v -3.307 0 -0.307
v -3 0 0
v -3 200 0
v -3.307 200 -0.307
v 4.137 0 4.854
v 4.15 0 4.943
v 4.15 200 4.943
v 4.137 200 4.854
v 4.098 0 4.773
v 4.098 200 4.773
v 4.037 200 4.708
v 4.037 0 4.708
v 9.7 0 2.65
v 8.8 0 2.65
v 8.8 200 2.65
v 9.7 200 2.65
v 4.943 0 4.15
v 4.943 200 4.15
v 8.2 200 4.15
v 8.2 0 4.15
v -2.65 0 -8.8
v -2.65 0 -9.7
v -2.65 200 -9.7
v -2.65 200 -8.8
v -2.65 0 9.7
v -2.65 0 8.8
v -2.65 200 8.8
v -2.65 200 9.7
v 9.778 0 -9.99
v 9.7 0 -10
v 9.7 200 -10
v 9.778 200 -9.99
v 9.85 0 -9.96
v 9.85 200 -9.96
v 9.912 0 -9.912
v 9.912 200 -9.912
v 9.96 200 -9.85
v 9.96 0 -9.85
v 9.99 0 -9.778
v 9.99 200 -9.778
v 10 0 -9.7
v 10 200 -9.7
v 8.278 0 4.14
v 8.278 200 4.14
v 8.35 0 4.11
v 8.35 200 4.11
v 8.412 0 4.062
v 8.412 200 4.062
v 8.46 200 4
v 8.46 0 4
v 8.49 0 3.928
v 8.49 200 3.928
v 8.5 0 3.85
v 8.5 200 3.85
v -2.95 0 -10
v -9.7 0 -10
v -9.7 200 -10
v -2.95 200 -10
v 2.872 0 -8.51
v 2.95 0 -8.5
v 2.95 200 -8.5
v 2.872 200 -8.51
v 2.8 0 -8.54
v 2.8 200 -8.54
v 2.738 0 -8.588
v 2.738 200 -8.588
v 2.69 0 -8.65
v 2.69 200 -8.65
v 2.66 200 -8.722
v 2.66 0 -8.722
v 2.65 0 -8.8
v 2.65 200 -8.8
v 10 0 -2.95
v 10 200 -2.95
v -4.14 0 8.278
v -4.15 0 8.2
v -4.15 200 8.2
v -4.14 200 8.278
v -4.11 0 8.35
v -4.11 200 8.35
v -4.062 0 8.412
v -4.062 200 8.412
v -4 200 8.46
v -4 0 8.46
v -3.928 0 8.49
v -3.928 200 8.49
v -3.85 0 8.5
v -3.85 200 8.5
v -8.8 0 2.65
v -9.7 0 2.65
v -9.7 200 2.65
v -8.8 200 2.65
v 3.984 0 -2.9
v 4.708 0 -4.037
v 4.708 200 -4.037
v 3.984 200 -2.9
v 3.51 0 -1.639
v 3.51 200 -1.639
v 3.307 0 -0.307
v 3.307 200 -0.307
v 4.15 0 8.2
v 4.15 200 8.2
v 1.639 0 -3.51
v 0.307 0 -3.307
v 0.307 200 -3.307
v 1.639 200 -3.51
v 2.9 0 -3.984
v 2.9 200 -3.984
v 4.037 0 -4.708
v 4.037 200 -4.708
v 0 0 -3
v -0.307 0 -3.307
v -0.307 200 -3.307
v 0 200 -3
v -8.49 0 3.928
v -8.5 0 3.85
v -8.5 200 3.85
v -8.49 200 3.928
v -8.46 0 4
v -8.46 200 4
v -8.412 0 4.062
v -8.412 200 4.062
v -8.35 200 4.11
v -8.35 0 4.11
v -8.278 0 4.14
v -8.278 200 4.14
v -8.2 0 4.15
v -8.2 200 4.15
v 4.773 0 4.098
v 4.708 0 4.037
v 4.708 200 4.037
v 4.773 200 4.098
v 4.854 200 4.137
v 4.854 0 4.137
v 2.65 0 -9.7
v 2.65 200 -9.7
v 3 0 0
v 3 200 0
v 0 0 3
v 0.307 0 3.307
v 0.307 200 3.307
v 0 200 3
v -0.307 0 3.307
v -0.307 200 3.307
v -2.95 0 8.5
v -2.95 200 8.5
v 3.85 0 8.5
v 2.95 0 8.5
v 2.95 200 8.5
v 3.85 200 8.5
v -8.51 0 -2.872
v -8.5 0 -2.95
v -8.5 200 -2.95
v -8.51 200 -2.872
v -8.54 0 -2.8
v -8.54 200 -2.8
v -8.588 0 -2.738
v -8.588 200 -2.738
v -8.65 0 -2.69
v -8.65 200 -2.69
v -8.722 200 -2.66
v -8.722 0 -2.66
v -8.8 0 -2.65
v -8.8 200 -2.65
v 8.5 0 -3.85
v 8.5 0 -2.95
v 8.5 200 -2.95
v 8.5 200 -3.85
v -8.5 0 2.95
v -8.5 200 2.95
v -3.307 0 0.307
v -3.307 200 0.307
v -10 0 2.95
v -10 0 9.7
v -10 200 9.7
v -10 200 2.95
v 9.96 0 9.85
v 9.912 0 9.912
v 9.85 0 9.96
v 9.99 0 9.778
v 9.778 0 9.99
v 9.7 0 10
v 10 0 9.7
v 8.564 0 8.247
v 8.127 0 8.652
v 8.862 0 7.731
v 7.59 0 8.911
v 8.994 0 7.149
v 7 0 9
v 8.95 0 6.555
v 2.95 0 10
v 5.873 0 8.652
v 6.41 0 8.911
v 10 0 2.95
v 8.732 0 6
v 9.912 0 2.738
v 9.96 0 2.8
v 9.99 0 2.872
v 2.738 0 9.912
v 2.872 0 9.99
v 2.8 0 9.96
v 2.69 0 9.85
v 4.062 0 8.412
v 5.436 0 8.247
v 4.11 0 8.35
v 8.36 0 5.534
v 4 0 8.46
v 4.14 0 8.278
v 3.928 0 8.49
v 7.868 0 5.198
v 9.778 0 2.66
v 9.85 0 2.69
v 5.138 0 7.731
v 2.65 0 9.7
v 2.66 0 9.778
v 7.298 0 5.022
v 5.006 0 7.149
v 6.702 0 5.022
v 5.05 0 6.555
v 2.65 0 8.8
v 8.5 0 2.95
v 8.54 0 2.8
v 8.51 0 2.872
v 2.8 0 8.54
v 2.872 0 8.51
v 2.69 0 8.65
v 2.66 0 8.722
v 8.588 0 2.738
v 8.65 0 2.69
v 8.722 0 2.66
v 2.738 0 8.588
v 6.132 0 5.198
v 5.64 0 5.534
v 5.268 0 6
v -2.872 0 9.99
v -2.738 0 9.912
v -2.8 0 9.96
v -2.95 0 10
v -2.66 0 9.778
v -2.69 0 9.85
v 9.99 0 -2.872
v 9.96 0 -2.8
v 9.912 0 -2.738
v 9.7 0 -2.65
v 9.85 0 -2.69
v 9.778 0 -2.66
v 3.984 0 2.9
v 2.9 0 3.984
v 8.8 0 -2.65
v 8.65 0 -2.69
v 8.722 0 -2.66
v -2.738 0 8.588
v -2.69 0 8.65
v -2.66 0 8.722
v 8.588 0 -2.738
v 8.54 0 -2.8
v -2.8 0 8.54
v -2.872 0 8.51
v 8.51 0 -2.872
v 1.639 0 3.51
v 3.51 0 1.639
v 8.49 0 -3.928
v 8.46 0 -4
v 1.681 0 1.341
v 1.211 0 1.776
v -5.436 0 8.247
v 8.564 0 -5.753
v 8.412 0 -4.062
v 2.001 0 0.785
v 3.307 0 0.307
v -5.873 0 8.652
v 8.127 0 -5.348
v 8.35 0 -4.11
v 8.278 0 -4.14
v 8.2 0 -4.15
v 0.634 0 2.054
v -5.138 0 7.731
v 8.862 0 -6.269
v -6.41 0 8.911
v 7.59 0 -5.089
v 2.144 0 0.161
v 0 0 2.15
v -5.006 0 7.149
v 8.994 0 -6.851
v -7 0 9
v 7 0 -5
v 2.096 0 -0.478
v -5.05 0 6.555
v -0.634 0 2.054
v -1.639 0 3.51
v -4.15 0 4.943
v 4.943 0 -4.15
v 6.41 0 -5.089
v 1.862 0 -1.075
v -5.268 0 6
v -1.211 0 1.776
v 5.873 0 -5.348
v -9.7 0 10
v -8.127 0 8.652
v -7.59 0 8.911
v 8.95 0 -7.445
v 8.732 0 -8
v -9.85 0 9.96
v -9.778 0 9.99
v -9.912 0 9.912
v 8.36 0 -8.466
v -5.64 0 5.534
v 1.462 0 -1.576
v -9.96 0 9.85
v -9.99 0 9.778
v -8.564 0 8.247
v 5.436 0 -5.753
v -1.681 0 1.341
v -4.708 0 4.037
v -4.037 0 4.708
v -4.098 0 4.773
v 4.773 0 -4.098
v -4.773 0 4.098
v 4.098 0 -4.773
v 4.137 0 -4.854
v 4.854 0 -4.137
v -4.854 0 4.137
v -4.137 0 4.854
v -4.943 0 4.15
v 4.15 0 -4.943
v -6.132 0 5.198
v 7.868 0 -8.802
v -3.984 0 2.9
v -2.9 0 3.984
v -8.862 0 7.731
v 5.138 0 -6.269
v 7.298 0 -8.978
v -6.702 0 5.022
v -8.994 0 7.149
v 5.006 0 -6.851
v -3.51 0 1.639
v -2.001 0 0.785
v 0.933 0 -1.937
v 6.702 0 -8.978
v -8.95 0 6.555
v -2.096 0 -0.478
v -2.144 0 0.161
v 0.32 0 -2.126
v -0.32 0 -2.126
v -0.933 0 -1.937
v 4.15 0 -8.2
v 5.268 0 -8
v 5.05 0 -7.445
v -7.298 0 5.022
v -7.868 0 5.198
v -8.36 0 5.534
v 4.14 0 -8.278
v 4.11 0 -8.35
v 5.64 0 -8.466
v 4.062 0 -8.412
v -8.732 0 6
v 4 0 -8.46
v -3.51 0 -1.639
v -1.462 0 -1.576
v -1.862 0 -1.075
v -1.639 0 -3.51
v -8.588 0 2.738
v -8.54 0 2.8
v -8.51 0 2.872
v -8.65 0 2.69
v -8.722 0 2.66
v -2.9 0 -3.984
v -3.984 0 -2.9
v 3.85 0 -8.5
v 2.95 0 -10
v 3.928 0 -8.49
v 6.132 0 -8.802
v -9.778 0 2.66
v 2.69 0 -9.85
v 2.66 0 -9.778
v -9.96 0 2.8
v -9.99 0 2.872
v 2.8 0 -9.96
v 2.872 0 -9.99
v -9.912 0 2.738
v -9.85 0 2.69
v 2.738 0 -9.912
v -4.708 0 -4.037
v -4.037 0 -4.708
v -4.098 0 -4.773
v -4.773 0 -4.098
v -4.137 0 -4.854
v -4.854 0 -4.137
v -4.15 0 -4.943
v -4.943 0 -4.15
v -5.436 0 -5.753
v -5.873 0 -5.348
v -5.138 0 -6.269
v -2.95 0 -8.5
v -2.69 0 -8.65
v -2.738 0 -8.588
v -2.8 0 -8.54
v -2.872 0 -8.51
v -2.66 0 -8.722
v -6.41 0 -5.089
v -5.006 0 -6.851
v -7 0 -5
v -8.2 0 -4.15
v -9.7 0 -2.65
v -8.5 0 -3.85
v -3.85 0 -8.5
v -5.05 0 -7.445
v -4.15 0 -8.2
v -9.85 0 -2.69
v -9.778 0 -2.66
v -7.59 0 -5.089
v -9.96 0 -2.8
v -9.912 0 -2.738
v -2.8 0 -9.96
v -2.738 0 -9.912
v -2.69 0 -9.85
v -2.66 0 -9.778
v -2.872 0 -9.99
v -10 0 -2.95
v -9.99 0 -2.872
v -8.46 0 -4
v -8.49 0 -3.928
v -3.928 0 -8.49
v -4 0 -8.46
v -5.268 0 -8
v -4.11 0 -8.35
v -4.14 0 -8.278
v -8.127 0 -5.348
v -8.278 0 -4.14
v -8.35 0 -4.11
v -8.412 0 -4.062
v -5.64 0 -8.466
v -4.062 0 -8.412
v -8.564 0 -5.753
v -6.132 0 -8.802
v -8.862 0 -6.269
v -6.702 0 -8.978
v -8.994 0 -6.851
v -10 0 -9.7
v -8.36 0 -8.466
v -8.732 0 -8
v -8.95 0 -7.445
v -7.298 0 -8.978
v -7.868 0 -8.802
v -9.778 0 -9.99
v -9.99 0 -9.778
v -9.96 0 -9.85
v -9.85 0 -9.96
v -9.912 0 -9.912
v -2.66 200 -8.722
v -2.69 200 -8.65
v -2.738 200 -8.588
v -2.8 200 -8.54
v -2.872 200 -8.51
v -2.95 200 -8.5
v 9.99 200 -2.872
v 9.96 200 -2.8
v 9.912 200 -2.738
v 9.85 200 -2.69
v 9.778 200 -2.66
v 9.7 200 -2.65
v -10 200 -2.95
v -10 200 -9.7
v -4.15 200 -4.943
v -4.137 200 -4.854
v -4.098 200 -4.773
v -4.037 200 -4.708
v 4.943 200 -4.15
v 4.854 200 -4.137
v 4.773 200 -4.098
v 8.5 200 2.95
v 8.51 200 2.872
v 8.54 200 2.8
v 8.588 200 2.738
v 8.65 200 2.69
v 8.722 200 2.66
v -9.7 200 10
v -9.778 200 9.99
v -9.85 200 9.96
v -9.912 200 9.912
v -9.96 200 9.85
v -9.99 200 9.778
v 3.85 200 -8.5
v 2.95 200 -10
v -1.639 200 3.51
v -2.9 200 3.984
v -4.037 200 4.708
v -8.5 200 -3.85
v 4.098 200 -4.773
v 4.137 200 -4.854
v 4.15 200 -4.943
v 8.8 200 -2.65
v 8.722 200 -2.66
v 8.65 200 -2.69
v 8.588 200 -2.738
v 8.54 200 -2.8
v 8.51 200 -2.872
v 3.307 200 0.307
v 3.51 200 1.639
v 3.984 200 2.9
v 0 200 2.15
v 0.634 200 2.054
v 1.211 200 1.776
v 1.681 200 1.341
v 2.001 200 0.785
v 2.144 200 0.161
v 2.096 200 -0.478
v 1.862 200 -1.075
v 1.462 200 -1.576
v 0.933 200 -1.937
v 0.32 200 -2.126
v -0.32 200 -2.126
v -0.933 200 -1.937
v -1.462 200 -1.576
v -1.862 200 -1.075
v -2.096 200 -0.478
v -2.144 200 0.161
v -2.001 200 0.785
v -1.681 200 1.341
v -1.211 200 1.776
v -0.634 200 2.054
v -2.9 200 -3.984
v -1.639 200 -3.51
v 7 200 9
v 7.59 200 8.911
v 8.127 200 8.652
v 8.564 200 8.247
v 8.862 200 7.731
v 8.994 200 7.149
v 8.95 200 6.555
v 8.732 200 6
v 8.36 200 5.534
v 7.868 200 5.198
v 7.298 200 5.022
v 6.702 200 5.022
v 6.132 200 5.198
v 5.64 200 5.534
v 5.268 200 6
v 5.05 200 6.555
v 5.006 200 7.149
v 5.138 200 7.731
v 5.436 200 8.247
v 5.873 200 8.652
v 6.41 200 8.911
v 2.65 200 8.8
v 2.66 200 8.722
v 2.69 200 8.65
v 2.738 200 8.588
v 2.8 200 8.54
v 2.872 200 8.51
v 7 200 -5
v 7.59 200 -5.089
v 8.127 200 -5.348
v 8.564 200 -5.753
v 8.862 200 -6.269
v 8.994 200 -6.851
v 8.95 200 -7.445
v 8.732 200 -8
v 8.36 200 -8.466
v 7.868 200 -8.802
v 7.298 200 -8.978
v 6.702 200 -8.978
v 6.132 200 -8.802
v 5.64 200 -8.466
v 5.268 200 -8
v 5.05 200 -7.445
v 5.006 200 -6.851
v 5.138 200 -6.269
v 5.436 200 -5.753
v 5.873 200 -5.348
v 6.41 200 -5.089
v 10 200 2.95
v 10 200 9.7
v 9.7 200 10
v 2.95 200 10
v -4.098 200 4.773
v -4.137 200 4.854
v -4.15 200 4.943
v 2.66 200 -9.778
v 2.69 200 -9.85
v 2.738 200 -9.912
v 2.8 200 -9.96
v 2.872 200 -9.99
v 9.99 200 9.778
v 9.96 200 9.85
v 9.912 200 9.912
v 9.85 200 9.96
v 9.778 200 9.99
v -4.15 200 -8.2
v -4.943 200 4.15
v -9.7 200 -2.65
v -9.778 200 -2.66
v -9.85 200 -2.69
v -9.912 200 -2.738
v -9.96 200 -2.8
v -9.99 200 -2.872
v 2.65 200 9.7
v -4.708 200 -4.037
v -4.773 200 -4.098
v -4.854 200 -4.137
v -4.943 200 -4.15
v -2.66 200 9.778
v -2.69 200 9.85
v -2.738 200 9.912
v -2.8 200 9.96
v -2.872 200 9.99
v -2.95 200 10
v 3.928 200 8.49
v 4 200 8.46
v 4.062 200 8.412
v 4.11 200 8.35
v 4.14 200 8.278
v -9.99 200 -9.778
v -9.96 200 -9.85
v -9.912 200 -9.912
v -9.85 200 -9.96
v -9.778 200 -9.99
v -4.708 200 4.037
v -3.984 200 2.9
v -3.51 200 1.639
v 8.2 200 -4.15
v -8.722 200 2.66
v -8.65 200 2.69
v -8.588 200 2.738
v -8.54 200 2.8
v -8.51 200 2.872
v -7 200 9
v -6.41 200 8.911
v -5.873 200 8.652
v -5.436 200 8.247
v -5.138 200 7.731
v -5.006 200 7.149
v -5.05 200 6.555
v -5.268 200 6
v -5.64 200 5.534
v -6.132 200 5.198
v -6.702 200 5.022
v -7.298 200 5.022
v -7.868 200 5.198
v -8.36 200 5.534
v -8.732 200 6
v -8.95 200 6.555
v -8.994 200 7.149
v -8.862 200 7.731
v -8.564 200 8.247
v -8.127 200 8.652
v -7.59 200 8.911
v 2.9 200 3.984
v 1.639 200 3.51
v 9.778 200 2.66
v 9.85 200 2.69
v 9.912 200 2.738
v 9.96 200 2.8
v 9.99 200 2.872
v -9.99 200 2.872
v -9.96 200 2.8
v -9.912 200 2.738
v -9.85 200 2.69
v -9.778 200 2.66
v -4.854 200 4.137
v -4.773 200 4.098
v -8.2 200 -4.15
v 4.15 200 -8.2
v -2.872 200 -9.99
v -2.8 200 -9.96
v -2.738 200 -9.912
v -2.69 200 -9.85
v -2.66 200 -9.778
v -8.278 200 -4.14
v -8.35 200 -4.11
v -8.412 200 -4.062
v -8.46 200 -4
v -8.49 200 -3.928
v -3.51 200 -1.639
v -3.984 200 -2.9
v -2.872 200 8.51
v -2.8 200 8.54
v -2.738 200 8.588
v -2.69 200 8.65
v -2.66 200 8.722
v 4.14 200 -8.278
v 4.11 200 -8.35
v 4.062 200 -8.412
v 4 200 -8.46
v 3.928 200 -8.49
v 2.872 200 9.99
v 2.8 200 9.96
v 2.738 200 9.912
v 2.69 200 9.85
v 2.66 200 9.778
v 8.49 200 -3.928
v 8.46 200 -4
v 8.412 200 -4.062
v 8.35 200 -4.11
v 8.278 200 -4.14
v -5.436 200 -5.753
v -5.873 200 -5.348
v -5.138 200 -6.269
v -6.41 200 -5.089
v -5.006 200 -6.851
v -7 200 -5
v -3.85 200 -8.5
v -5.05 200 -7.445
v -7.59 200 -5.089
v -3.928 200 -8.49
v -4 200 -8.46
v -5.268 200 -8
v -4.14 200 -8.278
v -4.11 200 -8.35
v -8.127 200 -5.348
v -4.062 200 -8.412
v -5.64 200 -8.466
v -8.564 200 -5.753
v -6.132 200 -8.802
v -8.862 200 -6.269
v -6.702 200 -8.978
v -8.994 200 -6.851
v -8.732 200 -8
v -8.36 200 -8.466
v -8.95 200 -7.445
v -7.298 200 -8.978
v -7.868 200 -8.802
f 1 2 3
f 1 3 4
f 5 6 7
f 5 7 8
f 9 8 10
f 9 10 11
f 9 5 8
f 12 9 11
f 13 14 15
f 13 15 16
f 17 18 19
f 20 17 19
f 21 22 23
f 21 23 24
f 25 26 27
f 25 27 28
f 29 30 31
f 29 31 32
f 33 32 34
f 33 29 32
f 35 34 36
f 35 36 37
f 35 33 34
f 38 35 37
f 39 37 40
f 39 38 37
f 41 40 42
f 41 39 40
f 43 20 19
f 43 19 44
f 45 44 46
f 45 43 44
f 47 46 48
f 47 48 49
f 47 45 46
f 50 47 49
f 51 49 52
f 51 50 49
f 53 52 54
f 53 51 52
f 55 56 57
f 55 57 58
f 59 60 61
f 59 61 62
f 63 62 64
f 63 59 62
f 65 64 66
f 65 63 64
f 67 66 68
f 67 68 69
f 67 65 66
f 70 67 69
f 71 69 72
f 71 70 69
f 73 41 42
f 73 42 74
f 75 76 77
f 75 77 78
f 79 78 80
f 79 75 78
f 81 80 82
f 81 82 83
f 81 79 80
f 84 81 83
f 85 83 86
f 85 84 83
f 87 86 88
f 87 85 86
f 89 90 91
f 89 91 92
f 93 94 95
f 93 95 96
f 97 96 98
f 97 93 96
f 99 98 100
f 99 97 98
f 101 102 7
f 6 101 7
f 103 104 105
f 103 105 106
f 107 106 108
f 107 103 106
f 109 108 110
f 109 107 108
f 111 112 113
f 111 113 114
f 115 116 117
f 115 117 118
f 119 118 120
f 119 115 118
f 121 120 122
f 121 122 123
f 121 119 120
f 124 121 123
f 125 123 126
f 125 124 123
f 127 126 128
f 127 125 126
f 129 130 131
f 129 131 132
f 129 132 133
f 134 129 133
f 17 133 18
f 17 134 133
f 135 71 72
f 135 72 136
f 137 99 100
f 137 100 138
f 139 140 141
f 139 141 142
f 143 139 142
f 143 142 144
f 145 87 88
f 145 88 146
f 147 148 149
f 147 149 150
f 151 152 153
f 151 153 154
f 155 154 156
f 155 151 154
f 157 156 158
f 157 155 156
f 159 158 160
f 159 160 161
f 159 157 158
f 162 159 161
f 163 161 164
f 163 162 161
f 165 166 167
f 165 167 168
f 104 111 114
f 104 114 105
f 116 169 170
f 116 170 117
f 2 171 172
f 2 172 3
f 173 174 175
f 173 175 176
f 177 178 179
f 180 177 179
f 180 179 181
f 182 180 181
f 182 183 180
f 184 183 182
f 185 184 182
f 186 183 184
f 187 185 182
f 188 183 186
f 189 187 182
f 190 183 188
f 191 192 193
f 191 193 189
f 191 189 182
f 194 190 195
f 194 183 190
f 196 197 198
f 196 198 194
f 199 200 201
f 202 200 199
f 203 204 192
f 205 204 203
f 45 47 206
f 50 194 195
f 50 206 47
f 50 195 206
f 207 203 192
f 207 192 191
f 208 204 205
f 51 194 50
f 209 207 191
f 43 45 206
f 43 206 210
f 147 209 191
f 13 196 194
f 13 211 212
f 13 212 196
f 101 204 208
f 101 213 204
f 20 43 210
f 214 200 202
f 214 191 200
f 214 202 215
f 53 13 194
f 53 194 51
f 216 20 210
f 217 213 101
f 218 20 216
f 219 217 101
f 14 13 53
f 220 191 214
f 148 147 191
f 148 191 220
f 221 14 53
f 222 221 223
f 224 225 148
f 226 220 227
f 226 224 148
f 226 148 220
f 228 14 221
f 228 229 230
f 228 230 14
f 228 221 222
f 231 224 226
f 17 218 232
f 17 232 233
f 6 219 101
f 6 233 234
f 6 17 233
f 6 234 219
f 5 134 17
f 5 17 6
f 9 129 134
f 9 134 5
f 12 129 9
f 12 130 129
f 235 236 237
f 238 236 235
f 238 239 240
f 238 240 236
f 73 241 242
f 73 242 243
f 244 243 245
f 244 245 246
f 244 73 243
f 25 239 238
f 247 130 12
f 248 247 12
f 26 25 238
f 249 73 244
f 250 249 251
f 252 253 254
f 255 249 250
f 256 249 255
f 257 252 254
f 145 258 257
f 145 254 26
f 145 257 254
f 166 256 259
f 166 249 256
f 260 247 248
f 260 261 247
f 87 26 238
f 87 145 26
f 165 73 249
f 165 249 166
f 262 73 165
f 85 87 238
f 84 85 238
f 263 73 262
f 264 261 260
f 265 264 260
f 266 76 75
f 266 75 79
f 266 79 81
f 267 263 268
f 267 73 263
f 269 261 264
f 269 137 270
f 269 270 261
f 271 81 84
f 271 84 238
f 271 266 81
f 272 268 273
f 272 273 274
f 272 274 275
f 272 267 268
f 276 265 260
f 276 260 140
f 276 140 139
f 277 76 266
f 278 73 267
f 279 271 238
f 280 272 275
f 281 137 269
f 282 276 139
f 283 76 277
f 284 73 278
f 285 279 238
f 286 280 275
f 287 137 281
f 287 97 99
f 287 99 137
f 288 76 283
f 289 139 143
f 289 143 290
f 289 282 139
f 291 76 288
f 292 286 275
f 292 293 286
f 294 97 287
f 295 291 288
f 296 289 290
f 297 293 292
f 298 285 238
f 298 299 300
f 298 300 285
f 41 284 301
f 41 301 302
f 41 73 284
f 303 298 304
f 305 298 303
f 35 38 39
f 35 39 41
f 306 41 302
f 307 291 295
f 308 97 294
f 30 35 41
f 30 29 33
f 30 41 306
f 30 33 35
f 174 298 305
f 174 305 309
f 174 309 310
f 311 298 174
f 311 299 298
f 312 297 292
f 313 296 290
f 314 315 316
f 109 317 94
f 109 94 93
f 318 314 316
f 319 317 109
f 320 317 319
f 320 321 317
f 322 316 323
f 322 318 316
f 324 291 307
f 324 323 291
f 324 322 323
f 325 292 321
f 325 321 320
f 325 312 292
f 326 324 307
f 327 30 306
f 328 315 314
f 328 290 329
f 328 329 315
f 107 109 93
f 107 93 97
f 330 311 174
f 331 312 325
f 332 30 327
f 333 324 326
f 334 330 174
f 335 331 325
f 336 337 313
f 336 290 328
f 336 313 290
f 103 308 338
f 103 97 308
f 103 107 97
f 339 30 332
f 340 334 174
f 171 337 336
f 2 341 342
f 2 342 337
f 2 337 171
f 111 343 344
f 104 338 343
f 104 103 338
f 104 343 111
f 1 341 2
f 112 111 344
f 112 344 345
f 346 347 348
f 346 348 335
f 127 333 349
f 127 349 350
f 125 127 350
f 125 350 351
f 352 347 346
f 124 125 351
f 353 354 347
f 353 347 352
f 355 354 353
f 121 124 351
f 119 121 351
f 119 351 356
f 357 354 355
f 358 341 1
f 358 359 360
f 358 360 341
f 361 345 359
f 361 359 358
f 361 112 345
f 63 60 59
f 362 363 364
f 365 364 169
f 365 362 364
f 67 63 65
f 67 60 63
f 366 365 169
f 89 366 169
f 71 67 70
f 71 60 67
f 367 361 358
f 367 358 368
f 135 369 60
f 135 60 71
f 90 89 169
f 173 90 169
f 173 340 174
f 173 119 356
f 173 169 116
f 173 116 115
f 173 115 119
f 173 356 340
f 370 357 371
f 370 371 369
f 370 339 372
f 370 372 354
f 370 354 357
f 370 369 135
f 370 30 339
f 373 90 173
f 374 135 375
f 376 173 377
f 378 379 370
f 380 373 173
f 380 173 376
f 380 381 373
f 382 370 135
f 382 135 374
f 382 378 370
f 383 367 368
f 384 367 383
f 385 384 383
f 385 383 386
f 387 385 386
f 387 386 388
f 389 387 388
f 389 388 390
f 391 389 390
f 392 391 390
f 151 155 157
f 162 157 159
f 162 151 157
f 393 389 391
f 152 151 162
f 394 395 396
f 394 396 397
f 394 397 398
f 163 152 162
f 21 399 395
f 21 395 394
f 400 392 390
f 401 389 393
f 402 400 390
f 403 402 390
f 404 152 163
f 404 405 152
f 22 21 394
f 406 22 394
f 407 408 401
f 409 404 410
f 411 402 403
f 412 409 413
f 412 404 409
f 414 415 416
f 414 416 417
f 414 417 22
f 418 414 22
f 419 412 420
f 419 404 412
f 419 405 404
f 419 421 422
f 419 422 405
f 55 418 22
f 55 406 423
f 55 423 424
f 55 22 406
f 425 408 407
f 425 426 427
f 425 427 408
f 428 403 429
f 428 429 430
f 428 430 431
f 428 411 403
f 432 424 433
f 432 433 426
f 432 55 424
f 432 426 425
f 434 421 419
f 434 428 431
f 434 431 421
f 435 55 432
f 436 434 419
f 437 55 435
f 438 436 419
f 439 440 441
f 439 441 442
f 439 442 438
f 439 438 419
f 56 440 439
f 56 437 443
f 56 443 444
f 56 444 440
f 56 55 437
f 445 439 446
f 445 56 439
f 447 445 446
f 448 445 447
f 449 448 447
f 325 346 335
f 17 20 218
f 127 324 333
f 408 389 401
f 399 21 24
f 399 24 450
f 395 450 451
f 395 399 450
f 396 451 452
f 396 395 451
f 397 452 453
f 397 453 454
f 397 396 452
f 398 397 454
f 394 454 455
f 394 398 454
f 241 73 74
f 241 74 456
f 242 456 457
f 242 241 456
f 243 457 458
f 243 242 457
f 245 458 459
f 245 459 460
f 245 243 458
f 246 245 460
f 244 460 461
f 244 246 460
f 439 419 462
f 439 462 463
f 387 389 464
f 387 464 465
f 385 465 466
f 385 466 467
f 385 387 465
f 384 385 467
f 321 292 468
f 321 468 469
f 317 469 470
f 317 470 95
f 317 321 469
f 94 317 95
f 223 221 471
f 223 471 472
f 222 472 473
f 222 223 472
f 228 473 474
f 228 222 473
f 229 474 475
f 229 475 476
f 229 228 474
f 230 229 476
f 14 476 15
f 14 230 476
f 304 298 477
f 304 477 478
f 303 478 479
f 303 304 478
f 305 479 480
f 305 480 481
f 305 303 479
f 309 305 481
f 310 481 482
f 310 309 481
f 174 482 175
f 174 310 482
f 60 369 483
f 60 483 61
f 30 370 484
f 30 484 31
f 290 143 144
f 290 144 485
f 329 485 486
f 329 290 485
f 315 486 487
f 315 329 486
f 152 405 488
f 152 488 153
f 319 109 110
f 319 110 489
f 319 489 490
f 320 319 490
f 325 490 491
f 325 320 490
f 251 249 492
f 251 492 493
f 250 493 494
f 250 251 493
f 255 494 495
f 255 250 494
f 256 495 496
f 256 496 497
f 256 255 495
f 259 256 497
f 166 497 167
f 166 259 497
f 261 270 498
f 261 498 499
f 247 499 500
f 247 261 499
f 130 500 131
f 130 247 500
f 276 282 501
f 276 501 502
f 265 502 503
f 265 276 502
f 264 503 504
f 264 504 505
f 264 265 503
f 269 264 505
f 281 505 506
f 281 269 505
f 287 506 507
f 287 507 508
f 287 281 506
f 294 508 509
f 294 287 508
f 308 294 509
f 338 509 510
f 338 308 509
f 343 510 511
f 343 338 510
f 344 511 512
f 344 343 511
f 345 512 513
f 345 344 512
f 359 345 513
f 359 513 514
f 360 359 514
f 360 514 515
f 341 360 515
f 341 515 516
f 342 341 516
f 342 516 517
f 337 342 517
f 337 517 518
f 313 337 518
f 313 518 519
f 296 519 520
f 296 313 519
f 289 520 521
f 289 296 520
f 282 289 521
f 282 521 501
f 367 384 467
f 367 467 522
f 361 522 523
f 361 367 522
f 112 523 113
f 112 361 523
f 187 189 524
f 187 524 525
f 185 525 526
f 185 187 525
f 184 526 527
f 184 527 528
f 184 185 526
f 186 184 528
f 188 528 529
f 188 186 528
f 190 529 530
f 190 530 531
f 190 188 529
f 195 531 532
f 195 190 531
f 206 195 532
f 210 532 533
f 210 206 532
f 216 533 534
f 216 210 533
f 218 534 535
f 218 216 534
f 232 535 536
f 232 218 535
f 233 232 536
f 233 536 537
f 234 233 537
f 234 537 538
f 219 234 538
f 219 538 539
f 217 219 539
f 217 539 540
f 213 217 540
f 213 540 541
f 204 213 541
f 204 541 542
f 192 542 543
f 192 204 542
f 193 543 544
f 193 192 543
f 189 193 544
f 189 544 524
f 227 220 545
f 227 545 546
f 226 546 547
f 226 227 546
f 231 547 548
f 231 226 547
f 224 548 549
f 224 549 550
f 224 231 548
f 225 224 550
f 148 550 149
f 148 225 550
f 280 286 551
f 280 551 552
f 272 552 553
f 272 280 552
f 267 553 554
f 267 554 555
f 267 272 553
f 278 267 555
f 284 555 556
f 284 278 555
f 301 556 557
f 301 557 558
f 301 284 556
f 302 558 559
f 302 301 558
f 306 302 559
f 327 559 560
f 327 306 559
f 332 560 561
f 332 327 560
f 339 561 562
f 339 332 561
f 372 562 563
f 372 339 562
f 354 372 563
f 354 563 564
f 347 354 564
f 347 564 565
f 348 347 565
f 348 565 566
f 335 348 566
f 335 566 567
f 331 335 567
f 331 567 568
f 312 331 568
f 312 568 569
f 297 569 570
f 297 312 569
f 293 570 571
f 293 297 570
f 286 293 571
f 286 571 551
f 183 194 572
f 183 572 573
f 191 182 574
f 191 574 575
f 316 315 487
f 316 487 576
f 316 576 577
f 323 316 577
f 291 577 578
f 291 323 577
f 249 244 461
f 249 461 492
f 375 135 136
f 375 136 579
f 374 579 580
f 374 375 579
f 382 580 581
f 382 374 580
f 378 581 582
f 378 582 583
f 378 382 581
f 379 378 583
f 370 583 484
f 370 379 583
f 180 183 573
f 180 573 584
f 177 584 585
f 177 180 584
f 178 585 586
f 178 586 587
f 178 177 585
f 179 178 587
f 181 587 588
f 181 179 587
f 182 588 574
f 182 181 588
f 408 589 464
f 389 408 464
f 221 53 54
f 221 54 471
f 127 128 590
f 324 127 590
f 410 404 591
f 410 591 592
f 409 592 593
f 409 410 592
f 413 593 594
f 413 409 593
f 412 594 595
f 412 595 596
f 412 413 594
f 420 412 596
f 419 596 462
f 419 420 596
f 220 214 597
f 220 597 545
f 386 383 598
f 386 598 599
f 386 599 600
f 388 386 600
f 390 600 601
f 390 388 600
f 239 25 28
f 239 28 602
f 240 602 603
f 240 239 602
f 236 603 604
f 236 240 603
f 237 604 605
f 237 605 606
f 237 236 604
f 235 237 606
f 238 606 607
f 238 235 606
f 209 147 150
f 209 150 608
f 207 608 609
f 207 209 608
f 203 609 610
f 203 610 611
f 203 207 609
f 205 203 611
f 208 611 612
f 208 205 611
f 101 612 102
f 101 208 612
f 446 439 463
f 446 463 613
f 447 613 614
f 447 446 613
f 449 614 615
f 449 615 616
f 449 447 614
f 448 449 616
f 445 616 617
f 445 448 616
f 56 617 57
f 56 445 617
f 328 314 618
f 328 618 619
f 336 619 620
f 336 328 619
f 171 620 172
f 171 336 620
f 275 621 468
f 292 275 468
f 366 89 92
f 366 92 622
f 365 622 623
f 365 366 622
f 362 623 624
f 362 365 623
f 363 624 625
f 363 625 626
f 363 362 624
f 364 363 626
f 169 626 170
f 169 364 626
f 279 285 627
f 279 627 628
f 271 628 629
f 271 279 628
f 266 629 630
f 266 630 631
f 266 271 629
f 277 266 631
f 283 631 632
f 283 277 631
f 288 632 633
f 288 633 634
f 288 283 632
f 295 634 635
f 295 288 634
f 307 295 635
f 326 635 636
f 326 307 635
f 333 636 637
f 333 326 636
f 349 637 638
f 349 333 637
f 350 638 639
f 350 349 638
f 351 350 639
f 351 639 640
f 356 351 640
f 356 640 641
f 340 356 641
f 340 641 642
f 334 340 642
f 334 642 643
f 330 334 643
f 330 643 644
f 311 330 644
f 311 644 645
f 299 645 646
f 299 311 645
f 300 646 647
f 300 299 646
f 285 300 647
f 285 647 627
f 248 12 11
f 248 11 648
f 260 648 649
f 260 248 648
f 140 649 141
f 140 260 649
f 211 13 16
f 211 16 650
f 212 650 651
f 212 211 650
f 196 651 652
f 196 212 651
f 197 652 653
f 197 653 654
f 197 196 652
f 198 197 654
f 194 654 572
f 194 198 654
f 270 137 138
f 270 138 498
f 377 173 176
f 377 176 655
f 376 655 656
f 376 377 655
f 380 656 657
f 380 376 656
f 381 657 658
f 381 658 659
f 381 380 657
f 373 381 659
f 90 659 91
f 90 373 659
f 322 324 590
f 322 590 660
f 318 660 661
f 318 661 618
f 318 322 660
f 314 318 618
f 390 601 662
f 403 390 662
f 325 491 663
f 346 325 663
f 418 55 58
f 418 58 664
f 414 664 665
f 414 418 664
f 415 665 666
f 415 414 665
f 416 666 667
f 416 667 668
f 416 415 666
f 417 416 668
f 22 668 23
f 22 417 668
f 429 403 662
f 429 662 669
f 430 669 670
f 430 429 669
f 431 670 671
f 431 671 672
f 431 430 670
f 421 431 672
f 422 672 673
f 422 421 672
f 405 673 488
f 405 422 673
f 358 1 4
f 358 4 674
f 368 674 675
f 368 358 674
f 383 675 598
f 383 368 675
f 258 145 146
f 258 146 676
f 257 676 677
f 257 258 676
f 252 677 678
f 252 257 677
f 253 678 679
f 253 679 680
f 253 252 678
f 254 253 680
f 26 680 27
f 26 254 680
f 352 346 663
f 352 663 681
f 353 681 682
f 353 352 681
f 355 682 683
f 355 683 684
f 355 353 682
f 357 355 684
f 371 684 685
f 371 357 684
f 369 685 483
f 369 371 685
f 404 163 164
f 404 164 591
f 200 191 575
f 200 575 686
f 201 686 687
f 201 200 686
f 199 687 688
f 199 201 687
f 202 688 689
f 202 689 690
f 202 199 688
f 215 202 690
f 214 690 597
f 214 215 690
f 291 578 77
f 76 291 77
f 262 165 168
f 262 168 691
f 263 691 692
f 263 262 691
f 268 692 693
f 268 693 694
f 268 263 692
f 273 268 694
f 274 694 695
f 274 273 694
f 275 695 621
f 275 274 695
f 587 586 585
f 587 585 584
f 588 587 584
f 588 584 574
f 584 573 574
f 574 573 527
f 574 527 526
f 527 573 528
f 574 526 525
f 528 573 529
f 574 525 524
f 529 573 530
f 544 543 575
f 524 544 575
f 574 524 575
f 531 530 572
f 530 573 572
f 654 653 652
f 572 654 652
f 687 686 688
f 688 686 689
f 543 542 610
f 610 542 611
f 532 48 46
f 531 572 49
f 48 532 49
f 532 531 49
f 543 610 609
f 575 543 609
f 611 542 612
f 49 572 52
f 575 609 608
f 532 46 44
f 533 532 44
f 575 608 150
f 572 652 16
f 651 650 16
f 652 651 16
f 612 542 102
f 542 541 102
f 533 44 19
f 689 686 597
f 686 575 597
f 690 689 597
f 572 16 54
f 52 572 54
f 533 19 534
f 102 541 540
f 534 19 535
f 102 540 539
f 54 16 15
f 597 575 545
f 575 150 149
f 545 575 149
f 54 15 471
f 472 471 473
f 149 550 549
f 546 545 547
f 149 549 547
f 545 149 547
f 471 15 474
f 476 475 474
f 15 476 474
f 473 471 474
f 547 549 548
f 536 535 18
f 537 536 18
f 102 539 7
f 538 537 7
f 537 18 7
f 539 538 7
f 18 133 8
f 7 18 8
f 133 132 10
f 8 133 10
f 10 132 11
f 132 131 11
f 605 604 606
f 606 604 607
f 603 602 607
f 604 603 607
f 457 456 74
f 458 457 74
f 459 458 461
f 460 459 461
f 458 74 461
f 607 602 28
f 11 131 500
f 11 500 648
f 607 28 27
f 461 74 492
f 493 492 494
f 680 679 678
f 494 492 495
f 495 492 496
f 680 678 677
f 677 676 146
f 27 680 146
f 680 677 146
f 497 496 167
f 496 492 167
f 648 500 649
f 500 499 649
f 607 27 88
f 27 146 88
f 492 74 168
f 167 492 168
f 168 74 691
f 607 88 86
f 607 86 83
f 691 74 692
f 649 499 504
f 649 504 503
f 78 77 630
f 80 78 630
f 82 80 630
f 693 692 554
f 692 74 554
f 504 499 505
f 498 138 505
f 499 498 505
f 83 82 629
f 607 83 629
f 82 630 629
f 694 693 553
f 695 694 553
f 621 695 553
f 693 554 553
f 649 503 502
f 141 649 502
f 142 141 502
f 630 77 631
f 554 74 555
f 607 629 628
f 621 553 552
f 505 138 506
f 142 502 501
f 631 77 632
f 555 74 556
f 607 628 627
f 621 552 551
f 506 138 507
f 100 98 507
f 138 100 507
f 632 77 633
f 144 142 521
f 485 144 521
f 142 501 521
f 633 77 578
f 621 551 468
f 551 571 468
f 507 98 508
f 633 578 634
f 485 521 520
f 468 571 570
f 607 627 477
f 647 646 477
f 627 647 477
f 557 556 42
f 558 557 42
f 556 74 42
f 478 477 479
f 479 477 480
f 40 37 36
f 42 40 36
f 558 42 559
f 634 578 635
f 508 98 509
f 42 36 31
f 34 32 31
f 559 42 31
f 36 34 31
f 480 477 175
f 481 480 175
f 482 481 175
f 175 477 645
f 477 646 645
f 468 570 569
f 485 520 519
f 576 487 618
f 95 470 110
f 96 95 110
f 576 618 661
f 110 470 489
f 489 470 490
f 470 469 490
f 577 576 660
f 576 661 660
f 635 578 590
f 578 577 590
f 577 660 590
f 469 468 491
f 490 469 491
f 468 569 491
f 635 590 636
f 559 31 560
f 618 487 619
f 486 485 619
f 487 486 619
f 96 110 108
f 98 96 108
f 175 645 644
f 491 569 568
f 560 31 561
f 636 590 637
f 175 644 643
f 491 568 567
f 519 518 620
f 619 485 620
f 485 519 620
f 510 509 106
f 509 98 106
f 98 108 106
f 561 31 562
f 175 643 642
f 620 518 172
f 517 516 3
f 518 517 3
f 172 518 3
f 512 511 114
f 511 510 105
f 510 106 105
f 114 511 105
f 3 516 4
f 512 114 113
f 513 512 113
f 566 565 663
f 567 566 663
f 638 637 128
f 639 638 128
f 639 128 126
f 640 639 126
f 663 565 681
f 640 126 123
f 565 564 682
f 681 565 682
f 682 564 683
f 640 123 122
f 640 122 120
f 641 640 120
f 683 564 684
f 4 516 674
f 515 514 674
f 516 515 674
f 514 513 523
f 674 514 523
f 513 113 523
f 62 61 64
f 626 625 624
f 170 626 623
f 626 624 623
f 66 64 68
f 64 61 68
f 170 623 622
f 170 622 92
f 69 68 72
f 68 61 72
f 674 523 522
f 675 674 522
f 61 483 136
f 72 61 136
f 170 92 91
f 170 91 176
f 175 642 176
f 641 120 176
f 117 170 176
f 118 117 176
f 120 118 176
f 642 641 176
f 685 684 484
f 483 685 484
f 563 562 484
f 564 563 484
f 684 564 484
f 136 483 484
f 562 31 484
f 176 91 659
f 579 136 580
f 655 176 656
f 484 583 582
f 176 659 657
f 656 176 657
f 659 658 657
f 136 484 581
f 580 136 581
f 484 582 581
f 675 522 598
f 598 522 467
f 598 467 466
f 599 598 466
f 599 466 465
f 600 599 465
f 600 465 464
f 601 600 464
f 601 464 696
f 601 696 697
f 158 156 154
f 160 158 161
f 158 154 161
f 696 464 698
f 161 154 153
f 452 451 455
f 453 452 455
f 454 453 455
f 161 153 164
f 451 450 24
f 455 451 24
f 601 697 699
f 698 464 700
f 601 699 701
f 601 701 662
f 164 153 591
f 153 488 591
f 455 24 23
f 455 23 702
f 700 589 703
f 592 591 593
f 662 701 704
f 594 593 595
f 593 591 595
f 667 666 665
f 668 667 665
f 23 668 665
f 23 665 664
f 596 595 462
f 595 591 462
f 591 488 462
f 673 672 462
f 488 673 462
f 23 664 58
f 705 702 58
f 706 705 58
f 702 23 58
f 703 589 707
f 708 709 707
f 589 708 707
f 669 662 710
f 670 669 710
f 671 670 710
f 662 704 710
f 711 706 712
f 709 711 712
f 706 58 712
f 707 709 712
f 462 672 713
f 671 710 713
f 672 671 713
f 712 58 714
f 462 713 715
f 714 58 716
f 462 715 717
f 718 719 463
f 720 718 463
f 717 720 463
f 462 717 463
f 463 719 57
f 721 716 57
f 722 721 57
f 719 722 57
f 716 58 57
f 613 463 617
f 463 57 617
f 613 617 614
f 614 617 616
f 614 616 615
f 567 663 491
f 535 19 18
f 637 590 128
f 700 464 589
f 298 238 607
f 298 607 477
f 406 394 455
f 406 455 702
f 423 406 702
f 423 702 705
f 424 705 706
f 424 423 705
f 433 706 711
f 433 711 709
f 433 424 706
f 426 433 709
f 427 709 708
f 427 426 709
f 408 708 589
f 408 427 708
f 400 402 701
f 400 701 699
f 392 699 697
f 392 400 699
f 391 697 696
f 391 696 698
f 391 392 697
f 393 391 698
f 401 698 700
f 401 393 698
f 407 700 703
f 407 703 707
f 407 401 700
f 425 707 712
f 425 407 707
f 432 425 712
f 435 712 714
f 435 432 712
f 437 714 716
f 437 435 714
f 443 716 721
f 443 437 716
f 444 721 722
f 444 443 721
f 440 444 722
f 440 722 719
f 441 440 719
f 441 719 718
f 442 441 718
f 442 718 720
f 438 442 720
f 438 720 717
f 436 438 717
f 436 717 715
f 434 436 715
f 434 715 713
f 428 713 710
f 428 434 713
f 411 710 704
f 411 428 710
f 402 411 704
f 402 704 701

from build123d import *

# Parameters (mm, degrees)
SKETCH_1_R      = 2.15
SKETCH_1_R_2    = 2
EXTRUDE_1_DEPTH = 200


with BuildPart() as part:
    # 스케치1 → 보스-돌출1 (new body)
    with BuildSketch(Plane(origin=(0, 0, 0), x_dir=(1, 0, 0), z_dir=(0, 1, 0))):
        with BuildLine():
            Line((4.15, 4.942749448), (4.15, 8.2))
            ThreePointArc((4.15, 8.2), (4.062132034, 8.412132034), (3.85, 8.5))
            Line((3.85, 8.5), (2.95, 8.5))
            ThreePointArc((2.95, 8.5), (2.737867966, 8.587867966), (2.65, 8.8))
            Line((2.65, 8.8), (2.65, 9.7))
            ThreePointArc((2.65, 9.7), (2.737867966, 9.912132034), (2.95, 10))
            Line((2.95, 10), (9.7, 10))
            ThreePointArc((9.7, 10), (9.912132034, 9.912132034), (10, 9.7))
            Line((10, 9.7), (10, 2.95))
            ThreePointArc((10, 2.95), (9.912132034, 2.737867966), (9.7, 2.65))
            Line((9.7, 2.65), (8.8, 2.65))
            ThreePointArc((8.8, 2.65), (8.587867966, 2.737867966), (8.5, 2.95))
            Line((8.5, 2.95), (8.5, 3.85))
            ThreePointArc((8.5, 3.85), (8.412132034, 4.062132034), (8.2, 4.15))
            Line((8.2, 4.15), (4.942749448, 4.15))
            ThreePointArc((4.942749448, 4.15), (4.812307598, 4.120157221), (4.707817398, 4.03656616))
            ThreePointArc((4.707817398, 4.03656616), (3.714379176, 2.282021525), (3.307277366, 0.307277366))
            Line((3.307277366, 0.307277366), (3, 0))
            Line((3, 0), (3.307277366, -0.307277366))
            ThreePointArc((3.307277366, -0.307277366), (3.714379176, -2.282021525), (4.707817398, -4.03656616))
            ThreePointArc((4.707817398, -4.03656616), (4.812307598, -4.120157221), (4.942749448, -4.15))
            Line((4.942749448, -4.15), (8.2, -4.15))
            ThreePointArc((8.2, -4.15), (8.412132034, -4.062132034), (8.5, -3.85))
            Line((8.5, -3.85), (8.5, -2.95))
            ThreePointArc((8.5, -2.95), (8.587867966, -2.737867966), (8.8, -2.65))
            Line((8.8, -2.65), (9.7, -2.65))
            ThreePointArc((9.7, -2.65), (9.912132034, -2.737867966), (10, -2.95))
            Line((10, -2.95), (10, -9.7))
            ThreePointArc((10, -9.7), (9.912132034, -9.912132034), (9.7, -10))
            Line((9.7, -10), (2.95, -10))
            ThreePointArc((2.95, -10), (2.737867966, -9.912132034), (2.65, -9.7))
            Line((2.65, -9.7), (2.65, -8.8))
            ThreePointArc((2.65, -8.8), (2.737867966, -8.587867966), (2.95, -8.5))
            Line((2.95, -8.5), (3.85, -8.5))
            ThreePointArc((3.85, -8.5), (4.062132034, -8.412132034), (4.15, -8.2))
            Line((4.15, -8.2), (4.15, -4.942749448))
            ThreePointArc((4.15, -4.942749448), (4.120157221, -4.812307598), (4.03656616, -4.707817398))
            ThreePointArc((4.03656616, -4.707817398), (2.282021525, -3.714379176), (0.307277366, -3.307277366))
            Line((0.307277366, -3.307277366), (0, -3))
            Line((0, -3), (-0.307277366, -3.307277366))
            ThreePointArc((-0.307277366, -3.307277366), (-2.282021525, -3.714379176), (-4.03656616, -4.707817398))
            ThreePointArc((-4.03656616, -4.707817398), (-4.120157221, -4.812307598), (-4.15, -4.942749448))
            Line((-4.15, -4.942749448), (-4.15, -8.2))
            ThreePointArc((-4.15, -8.2), (-4.062132034, -8.412132034), (-3.85, -8.5))
            Line((-3.85, -8.5), (-2.95, -8.5))
            ThreePointArc((-2.95, -8.5), (-2.737867966, -8.587867966), (-2.65, -8.8))
            Line((-2.65, -8.8), (-2.65, -9.7))
            ThreePointArc((-2.65, -9.7), (-2.737867966, -9.912132034), (-2.95, -10))
            Line((-2.95, -10), (-9.7, -10))
            ThreePointArc((-9.7, -10), (-9.912132034, -9.912132034), (-10, -9.7))
            Line((-10, -9.7), (-10, -2.95))
            ThreePointArc((-10, -2.95), (-9.912132034, -2.737867966), (-9.7, -2.65))
            Line((-9.7, -2.65), (-8.8, -2.65))
            ThreePointArc((-8.8, -2.65), (-8.587867966, -2.737867966), (-8.5, -2.95))
            Line((-8.5, -2.95), (-8.5, -3.85))
            ThreePointArc((-8.5, -3.85), (-8.412132034, -4.062132034), (-8.2, -4.15))
            Line((-8.2, -4.15), (-4.942749448, -4.15))
            ThreePointArc((-4.942749448, -4.15), (-4.812307598, -4.120157221), (-4.707817398, -4.03656616))
            ThreePointArc((-4.707817398, -4.03656616), (-3.714379176, -2.282021525), (-3.307277366, -0.307277366))
            Line((-3.307277366, -0.307277366), (-3, 0))
            Line((-3, 0), (-3.307277366, 0.307277366))
            ThreePointArc((-3.307277366, 0.307277366), (-3.714379176, 2.282021525), (-4.707817398, 4.03656616))
            ThreePointArc((-4.707817398, 4.03656616), (-4.812307598, 4.120157221), (-4.942749448, 4.15))
            Line((-4.942749448, 4.15), (-8.2, 4.15))
            ThreePointArc((-8.2, 4.15), (-8.412132034, 4.062132034), (-8.5, 3.85))
            Line((-8.5, 3.85), (-8.5, 2.95))
            ThreePointArc((-8.5, 2.95), (-8.587867966, 2.737867966), (-8.8, 2.65))
            Line((-8.8, 2.65), (-9.7, 2.65))
            ThreePointArc((-9.7, 2.65), (-9.912132034, 2.737867966), (-10, 2.95))
            Line((-10, 2.95), (-10, 9.7))
            ThreePointArc((-10, 9.7), (-9.912132034, 9.912132034), (-9.7, 10))
            Line((-9.7, 10), (-2.95, 10))
            ThreePointArc((-2.95, 10), (-2.737867966, 9.912132034), (-2.65, 9.7))
            Line((-2.65, 9.7), (-2.65, 8.8))
            ThreePointArc((-2.65, 8.8), (-2.737867966, 8.587867966), (-2.95, 8.5))
            Line((-2.95, 8.5), (-3.85, 8.5))
            ThreePointArc((-3.85, 8.5), (-4.062132034, 8.412132034), (-4.15, 8.2))
            Line((-4.15, 8.2), (-4.15, 4.942749448))
            ThreePointArc((-4.15, 4.942749448), (-4.120157221, 4.812307598), (-4.03656616, 4.707817398))
            ThreePointArc((-4.03656616, 4.707817398), (-2.282021525, 3.714379176), (-0.307277366, 3.307277366))
            Line((-0.307277366, 3.307277366), (0, 3))
            Line((0, 3), (0.307277366, 3.307277366))
            ThreePointArc((0.307277366, 3.307277366), (2.282021525, 3.714379176), (4.03656616, 4.707817398))
            ThreePointArc((4.03656616, 4.707817398), (4.120157221, 4.812307598), (4.15, 4.942749448))
        make_face()
        with Locations(Location((0, 0, 0), (0, 0, 270))):
            Circle(SKETCH_1_R, mode=Mode.SUBTRACT)
        with Locations(Location((-7, 7, 0), (0, 0, 270))):
            Circle(SKETCH_1_R_2, mode=Mode.SUBTRACT)
        with Locations(Location((-7, -7, 0), (0, 0, 270))):
            Circle(SKETCH_1_R_2, mode=Mode.SUBTRACT)
        with Locations(Location((7, 7, 0), (0, 0, 270))):
            Circle(SKETCH_1_R_2, mode=Mode.SUBTRACT)
        with Locations(Location((7, -7, 0), (0, 0, 270))):
            Circle(SKETCH_1_R_2, mode=Mode.SUBTRACT)
    extrude(amount=EXTRUDE_1_DEPTH)


solid = part.part
